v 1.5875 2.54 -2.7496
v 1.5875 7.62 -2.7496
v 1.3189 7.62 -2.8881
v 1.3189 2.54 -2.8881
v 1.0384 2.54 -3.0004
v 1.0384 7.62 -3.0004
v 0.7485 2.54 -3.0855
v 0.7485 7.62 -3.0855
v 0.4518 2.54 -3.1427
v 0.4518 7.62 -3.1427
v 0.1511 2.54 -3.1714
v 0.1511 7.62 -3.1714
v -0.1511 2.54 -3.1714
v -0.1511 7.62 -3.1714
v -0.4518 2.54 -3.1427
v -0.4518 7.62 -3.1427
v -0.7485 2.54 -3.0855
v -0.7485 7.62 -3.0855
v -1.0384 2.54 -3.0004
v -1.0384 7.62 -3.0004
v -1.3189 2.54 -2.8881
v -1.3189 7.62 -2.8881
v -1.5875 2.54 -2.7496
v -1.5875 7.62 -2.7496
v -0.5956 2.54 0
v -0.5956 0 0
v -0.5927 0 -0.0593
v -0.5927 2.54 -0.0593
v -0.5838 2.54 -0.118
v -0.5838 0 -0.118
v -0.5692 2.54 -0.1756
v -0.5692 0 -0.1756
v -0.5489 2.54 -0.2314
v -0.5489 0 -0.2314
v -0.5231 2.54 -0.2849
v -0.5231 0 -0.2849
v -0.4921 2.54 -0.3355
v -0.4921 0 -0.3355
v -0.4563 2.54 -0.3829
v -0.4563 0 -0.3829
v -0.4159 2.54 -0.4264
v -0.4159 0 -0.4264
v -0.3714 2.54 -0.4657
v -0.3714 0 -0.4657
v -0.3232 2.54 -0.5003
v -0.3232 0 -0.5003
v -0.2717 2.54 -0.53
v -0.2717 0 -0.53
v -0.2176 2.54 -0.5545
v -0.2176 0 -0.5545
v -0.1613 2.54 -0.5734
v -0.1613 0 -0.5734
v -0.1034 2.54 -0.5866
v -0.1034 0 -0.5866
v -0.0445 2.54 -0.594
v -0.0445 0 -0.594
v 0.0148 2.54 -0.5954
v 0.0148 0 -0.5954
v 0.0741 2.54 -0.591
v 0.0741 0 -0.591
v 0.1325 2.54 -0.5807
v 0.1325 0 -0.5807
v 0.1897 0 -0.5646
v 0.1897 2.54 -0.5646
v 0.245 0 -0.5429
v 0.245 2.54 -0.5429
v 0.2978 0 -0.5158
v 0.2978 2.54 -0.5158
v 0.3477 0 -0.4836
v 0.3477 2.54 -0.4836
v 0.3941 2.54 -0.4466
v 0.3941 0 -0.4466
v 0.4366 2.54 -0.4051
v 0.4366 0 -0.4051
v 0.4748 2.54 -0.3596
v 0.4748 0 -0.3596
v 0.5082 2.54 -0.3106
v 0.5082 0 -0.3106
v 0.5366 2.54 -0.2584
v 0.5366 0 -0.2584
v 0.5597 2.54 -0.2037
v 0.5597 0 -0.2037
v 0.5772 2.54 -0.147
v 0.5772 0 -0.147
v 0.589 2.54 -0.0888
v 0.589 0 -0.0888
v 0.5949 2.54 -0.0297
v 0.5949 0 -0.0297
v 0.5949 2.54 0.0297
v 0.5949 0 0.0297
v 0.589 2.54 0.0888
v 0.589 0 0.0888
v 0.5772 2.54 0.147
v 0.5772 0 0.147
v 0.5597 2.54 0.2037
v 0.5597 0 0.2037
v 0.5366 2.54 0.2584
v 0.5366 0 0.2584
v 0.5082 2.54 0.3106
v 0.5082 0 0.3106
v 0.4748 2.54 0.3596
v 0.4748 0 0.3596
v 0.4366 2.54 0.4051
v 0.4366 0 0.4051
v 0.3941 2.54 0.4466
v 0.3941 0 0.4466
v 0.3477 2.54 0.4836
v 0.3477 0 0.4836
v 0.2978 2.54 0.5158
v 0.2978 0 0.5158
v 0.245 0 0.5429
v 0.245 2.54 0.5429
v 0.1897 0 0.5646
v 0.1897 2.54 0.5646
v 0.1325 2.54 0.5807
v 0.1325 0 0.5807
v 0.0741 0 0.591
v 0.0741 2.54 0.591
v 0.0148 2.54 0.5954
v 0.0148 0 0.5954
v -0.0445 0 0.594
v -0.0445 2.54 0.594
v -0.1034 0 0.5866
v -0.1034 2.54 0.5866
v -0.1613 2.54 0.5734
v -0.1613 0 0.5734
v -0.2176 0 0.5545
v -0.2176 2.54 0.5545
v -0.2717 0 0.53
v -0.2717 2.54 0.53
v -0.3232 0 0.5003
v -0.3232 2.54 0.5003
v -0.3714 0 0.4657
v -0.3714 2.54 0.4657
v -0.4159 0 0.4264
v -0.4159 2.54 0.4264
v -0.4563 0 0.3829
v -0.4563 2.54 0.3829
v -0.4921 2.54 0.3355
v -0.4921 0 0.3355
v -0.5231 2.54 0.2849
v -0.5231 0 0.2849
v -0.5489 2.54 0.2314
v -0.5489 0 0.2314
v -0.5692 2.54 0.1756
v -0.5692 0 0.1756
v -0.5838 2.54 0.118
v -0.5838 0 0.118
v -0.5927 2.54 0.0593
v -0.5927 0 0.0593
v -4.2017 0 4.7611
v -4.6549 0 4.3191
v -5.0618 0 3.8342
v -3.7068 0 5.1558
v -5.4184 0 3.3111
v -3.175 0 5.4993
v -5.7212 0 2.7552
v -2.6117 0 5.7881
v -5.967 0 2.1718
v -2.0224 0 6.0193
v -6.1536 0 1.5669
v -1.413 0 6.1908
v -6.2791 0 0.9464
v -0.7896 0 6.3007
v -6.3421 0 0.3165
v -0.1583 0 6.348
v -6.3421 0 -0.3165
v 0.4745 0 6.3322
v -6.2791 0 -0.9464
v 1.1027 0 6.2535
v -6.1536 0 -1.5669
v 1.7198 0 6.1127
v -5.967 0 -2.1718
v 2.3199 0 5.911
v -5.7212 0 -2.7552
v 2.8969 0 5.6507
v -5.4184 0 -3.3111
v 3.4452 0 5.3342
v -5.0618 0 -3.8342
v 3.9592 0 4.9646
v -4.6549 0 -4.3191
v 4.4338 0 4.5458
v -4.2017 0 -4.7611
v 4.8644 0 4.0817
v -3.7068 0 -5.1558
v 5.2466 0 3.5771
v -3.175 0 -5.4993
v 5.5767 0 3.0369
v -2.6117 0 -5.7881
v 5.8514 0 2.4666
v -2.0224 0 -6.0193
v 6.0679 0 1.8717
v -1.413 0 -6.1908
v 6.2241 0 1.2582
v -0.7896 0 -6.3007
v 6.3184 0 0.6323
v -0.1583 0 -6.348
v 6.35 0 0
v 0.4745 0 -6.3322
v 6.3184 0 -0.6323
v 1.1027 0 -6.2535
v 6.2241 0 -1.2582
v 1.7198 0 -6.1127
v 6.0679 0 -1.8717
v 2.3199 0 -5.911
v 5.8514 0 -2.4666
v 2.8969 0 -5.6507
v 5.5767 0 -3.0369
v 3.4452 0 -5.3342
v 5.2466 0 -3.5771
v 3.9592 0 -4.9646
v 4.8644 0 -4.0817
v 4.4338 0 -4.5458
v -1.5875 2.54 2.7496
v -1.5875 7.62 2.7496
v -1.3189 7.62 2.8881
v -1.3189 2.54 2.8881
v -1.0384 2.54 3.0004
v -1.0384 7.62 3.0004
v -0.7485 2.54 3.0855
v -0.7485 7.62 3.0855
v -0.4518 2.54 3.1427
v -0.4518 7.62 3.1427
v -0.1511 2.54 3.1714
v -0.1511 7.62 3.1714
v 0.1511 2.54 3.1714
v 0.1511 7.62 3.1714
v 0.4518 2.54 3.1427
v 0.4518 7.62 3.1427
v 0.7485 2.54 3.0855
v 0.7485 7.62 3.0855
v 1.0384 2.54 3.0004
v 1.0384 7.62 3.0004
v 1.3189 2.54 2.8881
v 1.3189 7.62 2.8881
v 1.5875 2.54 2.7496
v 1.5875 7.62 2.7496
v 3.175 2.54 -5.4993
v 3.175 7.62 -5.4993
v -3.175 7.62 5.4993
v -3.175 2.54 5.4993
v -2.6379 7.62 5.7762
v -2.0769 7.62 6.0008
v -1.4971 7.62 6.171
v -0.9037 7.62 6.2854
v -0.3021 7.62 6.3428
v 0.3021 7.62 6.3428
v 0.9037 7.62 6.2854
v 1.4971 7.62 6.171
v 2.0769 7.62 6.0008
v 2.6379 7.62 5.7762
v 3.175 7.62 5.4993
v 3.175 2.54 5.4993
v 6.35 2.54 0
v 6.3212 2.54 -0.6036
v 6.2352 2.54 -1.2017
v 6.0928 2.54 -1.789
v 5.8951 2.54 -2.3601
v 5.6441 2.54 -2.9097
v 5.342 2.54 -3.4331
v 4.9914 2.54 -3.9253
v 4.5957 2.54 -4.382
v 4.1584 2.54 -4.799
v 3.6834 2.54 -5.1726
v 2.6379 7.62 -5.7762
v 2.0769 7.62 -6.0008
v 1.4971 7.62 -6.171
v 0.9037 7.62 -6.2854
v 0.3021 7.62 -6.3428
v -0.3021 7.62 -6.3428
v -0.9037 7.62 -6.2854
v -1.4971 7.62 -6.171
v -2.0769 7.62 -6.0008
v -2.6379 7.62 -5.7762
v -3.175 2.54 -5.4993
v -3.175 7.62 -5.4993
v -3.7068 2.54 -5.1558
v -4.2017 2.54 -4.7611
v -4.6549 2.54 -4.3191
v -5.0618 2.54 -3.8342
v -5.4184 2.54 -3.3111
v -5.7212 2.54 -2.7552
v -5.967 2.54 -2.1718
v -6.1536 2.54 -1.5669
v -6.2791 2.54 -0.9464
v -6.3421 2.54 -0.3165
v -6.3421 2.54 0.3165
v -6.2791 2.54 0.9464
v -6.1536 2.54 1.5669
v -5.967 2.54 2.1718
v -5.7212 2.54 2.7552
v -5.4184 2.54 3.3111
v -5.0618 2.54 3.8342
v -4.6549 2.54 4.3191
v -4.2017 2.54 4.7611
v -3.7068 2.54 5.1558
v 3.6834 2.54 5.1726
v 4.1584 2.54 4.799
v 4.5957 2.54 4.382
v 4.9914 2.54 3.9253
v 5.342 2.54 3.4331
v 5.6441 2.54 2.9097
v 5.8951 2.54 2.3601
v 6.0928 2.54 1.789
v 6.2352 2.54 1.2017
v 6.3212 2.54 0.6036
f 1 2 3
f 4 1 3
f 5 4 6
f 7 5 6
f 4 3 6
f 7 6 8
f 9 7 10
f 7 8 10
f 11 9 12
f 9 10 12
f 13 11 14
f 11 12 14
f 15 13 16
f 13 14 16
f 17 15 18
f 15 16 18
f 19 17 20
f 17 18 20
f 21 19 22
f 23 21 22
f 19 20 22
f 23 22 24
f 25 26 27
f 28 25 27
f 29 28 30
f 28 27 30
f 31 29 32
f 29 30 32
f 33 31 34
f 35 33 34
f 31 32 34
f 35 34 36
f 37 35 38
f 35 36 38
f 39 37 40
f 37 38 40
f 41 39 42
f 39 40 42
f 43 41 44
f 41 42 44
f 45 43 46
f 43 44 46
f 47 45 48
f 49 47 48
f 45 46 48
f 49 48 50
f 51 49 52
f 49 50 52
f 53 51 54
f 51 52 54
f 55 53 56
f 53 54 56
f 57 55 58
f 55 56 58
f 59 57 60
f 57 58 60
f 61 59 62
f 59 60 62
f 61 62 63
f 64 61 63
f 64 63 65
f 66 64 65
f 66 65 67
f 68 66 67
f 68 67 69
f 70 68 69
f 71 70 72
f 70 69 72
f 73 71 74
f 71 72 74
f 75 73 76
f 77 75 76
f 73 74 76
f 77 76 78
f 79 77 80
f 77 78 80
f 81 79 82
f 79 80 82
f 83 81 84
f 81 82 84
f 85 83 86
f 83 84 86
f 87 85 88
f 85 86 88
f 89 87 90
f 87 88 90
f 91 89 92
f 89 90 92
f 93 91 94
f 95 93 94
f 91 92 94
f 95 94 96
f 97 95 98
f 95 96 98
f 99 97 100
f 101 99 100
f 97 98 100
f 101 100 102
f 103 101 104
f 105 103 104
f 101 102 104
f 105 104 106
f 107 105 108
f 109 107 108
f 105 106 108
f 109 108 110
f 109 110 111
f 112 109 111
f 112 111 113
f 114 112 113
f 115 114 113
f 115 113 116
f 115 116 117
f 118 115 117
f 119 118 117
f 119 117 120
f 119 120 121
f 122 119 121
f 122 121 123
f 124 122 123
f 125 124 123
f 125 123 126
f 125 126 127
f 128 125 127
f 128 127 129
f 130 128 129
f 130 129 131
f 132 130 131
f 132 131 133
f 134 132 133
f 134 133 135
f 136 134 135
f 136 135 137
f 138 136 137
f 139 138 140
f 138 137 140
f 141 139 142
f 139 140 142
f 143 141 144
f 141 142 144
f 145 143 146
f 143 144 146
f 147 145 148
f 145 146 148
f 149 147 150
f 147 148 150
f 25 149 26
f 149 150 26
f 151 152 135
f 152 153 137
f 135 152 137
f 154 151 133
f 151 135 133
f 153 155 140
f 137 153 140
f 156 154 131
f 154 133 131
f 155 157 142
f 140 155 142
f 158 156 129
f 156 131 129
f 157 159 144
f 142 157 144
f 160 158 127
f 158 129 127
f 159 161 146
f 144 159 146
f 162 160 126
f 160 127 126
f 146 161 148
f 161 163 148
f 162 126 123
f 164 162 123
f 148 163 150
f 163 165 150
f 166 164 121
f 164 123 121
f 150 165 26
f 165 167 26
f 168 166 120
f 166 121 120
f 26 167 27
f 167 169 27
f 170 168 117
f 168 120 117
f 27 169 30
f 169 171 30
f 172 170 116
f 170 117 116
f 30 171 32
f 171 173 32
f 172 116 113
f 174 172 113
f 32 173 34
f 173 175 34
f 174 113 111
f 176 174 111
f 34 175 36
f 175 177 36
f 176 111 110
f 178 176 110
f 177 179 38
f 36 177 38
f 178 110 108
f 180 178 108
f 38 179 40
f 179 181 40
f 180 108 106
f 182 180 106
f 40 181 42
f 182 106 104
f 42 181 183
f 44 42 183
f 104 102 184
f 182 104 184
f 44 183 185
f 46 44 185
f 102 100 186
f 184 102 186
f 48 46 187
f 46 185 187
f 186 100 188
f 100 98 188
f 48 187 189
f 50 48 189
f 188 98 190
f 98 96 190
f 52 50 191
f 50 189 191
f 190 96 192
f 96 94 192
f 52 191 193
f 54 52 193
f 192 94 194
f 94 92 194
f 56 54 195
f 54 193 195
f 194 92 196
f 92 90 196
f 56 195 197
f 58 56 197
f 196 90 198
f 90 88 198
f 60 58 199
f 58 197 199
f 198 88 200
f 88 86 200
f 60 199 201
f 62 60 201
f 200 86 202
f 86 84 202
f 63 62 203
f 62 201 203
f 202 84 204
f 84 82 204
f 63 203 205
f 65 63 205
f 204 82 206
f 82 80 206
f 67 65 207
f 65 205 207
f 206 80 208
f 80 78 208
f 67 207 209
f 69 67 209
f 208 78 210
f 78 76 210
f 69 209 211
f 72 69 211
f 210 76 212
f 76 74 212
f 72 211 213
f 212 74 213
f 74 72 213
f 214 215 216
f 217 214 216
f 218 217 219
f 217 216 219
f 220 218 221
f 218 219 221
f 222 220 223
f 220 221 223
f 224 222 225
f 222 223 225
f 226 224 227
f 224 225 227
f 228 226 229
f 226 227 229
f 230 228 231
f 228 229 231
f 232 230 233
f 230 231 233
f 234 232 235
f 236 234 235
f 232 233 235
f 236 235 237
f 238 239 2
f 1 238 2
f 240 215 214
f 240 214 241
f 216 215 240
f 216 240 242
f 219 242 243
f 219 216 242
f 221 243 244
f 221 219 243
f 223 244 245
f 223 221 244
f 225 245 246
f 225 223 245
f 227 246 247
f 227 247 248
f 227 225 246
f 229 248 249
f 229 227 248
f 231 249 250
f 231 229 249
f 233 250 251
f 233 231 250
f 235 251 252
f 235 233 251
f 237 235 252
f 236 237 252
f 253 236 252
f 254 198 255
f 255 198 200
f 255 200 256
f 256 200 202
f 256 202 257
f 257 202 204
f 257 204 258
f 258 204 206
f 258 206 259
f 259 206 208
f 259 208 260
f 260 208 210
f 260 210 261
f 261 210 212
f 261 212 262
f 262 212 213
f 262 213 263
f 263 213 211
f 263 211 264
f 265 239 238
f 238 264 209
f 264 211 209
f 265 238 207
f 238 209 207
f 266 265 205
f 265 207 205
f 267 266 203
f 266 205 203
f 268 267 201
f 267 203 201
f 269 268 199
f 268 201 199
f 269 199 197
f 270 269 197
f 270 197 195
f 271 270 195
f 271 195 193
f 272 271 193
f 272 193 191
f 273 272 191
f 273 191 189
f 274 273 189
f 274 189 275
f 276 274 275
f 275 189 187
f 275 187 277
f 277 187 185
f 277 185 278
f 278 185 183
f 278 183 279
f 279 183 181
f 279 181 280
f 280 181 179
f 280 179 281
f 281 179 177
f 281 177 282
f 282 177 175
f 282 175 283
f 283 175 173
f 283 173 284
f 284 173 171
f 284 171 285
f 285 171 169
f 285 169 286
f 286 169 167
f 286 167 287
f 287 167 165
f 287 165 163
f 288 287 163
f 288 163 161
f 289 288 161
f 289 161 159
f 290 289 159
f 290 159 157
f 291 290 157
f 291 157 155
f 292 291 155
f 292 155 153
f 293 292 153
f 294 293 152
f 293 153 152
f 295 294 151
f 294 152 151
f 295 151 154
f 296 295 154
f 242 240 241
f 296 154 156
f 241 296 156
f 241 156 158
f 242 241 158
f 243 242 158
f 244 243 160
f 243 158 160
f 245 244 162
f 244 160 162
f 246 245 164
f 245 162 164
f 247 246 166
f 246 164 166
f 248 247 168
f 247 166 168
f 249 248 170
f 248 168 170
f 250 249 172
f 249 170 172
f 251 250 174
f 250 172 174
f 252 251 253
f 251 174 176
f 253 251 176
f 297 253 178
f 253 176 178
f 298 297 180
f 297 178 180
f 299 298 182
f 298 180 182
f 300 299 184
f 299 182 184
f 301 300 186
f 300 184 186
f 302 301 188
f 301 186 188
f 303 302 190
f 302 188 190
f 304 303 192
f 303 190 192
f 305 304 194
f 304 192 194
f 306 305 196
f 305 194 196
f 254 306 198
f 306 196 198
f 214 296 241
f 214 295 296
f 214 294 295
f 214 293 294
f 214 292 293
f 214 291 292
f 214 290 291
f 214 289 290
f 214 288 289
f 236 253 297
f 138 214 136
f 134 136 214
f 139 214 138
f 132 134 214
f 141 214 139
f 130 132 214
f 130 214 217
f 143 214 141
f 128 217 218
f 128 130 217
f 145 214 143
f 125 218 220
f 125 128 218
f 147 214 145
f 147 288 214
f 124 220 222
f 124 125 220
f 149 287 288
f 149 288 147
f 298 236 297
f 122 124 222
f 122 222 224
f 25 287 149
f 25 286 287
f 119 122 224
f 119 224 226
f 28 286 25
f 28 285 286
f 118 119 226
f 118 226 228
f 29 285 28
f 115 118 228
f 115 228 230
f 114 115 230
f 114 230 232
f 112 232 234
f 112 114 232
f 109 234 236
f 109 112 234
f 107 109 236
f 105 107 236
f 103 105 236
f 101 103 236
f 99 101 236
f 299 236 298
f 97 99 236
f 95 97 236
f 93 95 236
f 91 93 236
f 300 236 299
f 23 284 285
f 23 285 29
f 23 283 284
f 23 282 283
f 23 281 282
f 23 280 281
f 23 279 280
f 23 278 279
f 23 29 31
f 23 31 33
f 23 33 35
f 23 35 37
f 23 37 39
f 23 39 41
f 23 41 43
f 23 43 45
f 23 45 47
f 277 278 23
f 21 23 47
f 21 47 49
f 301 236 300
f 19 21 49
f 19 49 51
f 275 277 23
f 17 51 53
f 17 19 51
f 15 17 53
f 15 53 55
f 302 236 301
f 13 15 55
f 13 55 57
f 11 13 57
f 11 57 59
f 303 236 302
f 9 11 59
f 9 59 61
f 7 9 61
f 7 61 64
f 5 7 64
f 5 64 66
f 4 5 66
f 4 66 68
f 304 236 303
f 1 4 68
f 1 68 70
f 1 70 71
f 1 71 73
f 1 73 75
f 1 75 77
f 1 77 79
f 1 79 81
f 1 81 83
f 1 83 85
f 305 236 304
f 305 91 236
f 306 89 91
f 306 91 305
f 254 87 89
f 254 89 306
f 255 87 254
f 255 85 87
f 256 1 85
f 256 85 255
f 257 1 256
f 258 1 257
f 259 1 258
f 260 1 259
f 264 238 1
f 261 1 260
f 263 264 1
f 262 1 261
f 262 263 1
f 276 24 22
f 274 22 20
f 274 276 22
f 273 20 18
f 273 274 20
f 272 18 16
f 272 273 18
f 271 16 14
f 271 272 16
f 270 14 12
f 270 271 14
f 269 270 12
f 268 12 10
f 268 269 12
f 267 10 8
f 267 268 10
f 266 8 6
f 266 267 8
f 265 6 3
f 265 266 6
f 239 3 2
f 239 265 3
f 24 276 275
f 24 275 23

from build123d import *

# Parameters (mm, degrees)
SKETCH1_R             = 6.35
BOSS_EXTRUDE1_DEPTH   = 7.62
F_0_80_TAPPED_HOLE1_D = 1.19126
SKETCH4_R             = 3.175
CUT_EXTRUDE1_DEPTH    = 5.08
CUT_EXTRUDE2_DEPTH    = 5.08


with BuildPart() as part:
    # Sketch1 → Boss-Extrude1 (new body)
    with BuildSketch(Plane(origin=(0, 0, 0), x_dir=(1, 0, 0), z_dir=(0, 1, 0))):
        Circle(SKETCH1_R)
    extrude(amount=BOSS_EXTRUDE1_DEPTH)

    # #0-80 Tapped Hole1 (through all)
    with Locations(Plane(origin=(0, 7.62, 0), x_dir=(1, 0, 0), z_dir=(0, 1, 0))):
        with Locations((0, 0)):
            Hole(F_0_80_TAPPED_HOLE1_D / 2)

    # Sketch4 → Cut-Extrude1 (cut)
    with BuildSketch(Plane(origin=(0, 7.62, 0), x_dir=(1, 0, 0), z_dir=(0, 1, 0))):
        Circle(SKETCH4_R)
    extrude(amount=-CUT_EXTRUDE1_DEPTH, mode=Mode.SUBTRACT)

    # Sketch5 → Cut-Extrude2 (cut)
    with BuildSketch(Plane(origin=(0, 7.62, 0), x_dir=(1, 0, 0), z_dir=(0, 1, 0))):
        Polygon((0, 0), (-7.62, -13.198227154), (-7.62, 13.198227154), align=None)
    cut_extrude2 = extrude(amount=-CUT_EXTRUDE2_DEPTH, mode=Mode.SUBTRACT)

    # Mirror1: Cut-Extrude2 across plane
    add(cut_extrude2.mirror(Plane(origin=(0, 0, 0), x_dir=(0, 0, 1), z_dir=(1, 0, 0))), mode=Mode.SUBTRACT)


solid = part.part
